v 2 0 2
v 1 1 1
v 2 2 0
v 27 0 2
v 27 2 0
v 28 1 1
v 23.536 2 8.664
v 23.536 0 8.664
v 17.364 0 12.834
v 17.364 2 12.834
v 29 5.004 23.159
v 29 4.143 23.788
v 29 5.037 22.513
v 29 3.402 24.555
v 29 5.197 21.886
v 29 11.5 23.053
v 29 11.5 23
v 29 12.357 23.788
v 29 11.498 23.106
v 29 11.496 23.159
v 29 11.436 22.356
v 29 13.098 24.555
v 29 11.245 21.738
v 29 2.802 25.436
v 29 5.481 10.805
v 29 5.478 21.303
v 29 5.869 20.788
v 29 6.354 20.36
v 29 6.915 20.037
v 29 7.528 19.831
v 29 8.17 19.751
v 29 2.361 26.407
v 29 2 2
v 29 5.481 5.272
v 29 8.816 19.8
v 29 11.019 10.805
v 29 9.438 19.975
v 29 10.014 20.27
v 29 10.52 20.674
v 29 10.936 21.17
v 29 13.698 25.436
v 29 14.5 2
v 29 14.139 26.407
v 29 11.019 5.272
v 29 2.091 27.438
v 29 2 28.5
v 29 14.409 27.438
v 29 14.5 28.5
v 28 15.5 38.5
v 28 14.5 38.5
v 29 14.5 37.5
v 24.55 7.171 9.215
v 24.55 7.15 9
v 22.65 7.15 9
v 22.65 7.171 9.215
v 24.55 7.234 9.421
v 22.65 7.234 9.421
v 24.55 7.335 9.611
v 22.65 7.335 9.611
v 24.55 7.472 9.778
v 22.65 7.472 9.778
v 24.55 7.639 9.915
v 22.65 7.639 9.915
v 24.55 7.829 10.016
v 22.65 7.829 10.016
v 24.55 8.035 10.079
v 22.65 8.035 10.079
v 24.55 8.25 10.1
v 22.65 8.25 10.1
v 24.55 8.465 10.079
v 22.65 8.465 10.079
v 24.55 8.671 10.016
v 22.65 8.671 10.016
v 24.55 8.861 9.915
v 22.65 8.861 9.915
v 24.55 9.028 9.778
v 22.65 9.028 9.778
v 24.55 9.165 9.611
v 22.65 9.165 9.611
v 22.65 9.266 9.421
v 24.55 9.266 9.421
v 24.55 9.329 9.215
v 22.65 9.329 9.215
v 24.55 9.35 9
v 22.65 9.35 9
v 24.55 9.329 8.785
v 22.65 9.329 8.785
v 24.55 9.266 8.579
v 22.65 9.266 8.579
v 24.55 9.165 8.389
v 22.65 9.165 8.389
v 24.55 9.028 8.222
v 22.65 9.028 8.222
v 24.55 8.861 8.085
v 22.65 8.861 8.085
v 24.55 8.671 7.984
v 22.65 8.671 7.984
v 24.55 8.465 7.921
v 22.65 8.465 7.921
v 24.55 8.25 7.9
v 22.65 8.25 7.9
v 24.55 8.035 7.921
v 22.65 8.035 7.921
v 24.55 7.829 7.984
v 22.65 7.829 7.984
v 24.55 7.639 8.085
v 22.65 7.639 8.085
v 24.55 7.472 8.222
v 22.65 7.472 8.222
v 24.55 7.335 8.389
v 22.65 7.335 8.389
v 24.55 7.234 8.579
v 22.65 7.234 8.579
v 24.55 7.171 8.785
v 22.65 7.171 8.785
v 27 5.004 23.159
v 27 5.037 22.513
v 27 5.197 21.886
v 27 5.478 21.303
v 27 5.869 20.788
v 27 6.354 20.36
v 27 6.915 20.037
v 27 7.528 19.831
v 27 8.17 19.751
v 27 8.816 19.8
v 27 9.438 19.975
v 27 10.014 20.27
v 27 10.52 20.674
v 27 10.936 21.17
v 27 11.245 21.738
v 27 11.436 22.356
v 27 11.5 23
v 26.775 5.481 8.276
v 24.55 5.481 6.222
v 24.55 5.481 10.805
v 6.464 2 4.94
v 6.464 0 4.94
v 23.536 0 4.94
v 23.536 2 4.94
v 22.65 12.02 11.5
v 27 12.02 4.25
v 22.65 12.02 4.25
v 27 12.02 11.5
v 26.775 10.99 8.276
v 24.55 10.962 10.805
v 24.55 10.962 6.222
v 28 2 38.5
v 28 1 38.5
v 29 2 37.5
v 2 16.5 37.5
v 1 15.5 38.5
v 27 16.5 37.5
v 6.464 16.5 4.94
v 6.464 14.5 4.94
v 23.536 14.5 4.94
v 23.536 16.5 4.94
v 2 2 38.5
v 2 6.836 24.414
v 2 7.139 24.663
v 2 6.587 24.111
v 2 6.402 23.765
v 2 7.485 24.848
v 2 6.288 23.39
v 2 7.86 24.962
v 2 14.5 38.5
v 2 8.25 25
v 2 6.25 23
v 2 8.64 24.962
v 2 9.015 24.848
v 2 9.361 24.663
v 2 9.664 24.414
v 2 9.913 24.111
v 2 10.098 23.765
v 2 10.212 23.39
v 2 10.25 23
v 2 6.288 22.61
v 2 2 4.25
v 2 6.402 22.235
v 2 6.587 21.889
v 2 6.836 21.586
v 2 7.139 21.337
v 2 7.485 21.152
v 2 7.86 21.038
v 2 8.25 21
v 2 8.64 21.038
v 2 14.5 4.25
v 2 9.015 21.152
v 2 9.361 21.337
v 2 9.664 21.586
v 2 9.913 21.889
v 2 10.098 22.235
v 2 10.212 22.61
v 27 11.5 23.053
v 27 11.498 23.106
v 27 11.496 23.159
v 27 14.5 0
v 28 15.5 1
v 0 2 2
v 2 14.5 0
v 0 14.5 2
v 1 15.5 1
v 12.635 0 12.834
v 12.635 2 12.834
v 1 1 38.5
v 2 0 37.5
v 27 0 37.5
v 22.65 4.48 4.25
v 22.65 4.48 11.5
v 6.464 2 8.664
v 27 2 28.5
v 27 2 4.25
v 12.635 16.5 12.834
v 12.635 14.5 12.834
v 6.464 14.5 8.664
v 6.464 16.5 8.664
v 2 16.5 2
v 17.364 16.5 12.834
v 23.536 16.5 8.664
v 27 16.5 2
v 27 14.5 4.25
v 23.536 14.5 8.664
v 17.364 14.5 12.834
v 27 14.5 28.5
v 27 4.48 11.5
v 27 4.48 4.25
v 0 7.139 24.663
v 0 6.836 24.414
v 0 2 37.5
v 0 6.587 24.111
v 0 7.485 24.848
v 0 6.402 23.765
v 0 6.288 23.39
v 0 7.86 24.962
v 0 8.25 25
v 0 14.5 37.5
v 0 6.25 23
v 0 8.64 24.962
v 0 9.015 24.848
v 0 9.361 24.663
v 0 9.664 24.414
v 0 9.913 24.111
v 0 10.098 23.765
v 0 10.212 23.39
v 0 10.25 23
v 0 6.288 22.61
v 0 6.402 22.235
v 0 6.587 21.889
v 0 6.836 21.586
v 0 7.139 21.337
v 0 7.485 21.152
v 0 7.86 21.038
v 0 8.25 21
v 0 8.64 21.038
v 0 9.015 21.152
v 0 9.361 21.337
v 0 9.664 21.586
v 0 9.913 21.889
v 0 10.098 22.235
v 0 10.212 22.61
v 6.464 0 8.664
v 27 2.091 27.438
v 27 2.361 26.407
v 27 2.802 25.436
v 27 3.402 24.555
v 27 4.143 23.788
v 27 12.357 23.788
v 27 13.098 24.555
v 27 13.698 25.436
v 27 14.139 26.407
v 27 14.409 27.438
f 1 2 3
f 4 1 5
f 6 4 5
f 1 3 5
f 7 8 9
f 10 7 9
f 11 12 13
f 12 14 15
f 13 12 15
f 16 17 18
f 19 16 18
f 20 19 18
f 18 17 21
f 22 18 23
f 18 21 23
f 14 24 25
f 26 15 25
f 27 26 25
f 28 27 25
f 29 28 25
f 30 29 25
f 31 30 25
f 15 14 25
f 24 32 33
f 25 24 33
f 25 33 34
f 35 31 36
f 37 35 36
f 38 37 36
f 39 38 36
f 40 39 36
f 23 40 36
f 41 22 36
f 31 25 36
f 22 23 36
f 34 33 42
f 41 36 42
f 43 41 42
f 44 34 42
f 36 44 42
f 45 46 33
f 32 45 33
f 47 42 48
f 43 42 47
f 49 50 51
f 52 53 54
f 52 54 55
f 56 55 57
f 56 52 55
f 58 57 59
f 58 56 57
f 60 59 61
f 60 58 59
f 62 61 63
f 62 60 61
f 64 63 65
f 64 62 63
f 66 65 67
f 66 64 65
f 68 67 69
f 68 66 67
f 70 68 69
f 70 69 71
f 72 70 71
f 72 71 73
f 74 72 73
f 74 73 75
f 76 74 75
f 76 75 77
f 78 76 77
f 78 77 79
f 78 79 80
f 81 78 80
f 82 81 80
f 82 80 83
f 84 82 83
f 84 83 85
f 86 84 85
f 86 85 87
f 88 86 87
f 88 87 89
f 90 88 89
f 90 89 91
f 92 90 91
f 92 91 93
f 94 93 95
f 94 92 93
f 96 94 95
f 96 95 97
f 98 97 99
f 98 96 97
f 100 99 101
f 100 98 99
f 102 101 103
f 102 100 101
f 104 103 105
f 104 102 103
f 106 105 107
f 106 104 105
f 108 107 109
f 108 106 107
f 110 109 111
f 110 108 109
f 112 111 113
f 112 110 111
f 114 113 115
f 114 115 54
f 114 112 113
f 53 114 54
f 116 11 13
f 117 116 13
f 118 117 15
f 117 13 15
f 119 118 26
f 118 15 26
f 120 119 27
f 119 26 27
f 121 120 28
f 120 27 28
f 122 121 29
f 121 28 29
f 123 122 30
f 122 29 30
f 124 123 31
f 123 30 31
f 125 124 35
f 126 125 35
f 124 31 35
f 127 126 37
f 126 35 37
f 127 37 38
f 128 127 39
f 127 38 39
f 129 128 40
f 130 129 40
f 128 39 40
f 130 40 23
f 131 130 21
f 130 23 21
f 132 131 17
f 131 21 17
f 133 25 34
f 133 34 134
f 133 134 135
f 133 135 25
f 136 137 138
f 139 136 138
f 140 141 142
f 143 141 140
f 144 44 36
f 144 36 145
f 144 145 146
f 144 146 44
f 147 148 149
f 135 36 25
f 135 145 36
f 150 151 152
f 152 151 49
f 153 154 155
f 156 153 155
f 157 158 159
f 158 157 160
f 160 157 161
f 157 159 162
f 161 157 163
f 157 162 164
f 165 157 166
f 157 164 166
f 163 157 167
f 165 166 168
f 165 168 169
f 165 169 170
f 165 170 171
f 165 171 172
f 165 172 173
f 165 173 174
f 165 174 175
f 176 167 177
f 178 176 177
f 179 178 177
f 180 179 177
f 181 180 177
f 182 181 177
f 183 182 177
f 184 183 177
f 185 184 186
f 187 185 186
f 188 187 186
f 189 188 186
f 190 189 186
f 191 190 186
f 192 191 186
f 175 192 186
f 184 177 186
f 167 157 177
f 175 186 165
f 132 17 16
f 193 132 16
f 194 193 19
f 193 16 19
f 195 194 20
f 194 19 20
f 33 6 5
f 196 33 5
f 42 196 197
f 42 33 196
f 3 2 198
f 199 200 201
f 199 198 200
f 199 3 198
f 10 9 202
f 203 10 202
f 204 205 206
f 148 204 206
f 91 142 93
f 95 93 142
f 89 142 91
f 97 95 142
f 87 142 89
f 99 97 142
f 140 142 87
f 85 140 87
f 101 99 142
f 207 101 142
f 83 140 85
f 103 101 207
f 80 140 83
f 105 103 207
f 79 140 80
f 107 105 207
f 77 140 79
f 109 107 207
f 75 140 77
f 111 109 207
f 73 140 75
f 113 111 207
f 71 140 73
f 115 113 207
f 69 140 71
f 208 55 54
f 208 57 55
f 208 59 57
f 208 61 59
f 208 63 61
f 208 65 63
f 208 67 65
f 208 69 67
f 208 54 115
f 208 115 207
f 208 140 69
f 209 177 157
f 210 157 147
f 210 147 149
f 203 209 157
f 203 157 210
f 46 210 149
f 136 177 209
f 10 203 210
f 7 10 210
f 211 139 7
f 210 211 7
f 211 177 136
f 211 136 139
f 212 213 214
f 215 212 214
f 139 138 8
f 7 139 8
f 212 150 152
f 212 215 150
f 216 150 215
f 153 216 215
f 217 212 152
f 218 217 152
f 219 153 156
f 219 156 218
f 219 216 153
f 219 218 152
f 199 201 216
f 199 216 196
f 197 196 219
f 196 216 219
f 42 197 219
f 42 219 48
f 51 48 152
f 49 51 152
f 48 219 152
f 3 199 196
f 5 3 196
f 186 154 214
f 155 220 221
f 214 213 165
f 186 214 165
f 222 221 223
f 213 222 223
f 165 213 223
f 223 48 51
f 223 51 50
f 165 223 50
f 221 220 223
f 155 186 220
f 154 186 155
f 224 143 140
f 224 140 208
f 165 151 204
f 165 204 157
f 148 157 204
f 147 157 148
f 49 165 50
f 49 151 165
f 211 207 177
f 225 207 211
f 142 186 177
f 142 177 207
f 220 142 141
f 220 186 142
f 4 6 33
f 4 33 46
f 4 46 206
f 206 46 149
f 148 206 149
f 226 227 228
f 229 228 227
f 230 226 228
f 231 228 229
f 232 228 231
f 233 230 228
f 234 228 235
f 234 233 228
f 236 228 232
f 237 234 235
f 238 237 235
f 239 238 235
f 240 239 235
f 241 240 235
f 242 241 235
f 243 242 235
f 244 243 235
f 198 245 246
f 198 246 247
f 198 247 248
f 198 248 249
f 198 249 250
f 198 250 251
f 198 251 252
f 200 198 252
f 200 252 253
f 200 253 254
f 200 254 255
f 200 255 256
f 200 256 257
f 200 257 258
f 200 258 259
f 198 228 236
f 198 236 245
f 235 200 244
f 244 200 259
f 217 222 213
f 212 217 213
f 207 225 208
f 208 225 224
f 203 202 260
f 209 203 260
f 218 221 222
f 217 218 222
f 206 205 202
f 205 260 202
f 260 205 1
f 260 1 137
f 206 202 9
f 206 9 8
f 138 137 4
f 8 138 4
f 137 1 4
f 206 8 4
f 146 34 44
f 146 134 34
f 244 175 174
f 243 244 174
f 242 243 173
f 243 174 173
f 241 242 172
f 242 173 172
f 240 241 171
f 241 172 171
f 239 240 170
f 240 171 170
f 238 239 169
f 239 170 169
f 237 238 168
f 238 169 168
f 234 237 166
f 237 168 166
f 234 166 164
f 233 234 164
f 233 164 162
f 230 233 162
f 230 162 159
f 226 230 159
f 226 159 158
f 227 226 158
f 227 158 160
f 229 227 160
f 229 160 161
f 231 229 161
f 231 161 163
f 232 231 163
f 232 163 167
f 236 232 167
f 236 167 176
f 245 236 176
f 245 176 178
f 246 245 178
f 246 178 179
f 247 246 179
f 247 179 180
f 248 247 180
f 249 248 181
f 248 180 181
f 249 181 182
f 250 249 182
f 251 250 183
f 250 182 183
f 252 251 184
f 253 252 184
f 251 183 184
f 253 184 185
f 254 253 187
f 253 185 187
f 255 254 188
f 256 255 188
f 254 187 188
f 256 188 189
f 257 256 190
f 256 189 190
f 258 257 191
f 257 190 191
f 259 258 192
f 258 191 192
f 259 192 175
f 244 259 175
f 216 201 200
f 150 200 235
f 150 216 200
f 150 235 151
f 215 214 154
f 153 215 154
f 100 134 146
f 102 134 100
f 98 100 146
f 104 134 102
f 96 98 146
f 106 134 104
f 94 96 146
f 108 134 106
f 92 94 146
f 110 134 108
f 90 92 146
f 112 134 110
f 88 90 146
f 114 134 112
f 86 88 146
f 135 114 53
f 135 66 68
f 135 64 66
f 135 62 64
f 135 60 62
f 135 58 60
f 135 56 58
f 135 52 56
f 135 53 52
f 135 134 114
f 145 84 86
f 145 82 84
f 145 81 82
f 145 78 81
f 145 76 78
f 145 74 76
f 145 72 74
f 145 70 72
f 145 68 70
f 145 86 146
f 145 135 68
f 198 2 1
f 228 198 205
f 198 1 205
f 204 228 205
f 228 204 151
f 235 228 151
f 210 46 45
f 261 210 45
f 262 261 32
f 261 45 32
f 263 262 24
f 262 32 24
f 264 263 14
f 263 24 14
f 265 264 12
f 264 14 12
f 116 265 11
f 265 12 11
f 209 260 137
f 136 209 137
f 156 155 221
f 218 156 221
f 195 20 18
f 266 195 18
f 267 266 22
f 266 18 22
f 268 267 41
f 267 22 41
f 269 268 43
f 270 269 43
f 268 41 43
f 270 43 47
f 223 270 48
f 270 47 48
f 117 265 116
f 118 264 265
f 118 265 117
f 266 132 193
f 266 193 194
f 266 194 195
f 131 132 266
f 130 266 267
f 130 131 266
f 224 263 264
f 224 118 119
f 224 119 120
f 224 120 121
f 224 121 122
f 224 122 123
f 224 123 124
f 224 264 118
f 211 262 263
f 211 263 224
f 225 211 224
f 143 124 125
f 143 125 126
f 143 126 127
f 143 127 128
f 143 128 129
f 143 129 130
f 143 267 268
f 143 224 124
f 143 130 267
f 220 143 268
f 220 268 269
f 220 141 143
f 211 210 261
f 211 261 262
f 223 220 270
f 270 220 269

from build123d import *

# Parameters (mm, degrees)
F0_W      = 29
F0_H      = 16.5
F1_DEPTH  = 38.5
F2_T      = -2
F3_DEPTH  = 2.25
F4_SIZE   = 2
F5_SIZE   = 2
F6_SIZE   = 0.99999
F8_DEPTH  = 16.501
F9_W      = 12.5
F9_H      = 0.99999
F10_DEPTH = 2
F11_R     = 2
F12_DEPTH = 2.001
F13_W     = 7.54
F13_H     = 7.25
F13_R     = 1.1
F14_DEPTH = 4.35
F15_W     = 5.538
F15_H     = 5.533
F17_W     = 5.481
F17_H     = 4.583


# Not quite as in the source:
# - a fillet or chamfer is up to 0.001 mm smaller than in the source, because OpenCascade refuses the exact size


with BuildPart() as f1:
    # F0 (on Top) → F1 (new body)
    with BuildSketch(Plane.XY):
        with Locations((14.5, 8.25)):
            Rectangle(F0_W, F0_H)
    extrude(amount=F1_DEPTH)

    # F2
    f2_openings = [f1.faces().sort_by_distance(p)[0] for p in [
        (14.5, 8.25, 38.5),
    ]]
    offset(amount=F2_T, openings=f2_openings)

    # F3 (add): a face of the model
    f3_faces = [f1.faces().sort_by_distance(p)[0] for p in [
        (14.5, 8.25, 2),
    ]]
    extrude(f3_faces, amount=F3_DEPTH)

    # F4
    f4_edges = [f1.edges().sort_by_distance(p)[0] for p in [
        (0, 0, 19.25),
        (29, 0, 19.25),
        (29, 16.5, 19.25),
        (0, 16.5, 19.25),
    ]]
    chamfer(f4_edges, length=F4_SIZE)

    # F5 (call 1 of 4: OpenCascade refuses the feature's edges together)
    f5_edges = [f1.edges().sort_by_distance(p)[0] for p in [
        (14.5, 0, 0),
    ]]
    chamfer(f5_edges, length=F5_SIZE)

    # F5#2 (call 2 of 4)
    f5_2_edges = [f1.edges().sort_by_distance(p)[0] for p in [
        (0, 8.25, 0),
    ]]
    chamfer(f5_2_edges, length=F5_SIZE)

    # F5#3 (call 3 of 4)
    f5_3_edges = [f1.edges().sort_by_distance(p)[0] for p in [
        (14.5, 16.5, 0),
    ]]
    chamfer(f5_3_edges, length=F5_SIZE)

    # F5#4 (call 4 of 4)
    f5_4_edges = [f1.edges().sort_by_distance(p)[0] for p in [
        (29, 8.25, 0),
    ]]
    chamfer(f5_4_edges, length=F5_SIZE)

    # F6 (size 1 in the source; OpenCascade refuses exactly that, so slightly less here)
    f6_edges = [f1.edges().sort_by_distance(p)[0] for p in [
        (0, 8.25, 38.5),
        (14.5, 16.5, 38.5),
        (29, 8.25, 38.5),
        (14.5, 0, 38.5),
    ]]
    chamfer(f6_edges, length=F6_SIZE)

    # F7 (on face) → F8 (cut, through all)
    with BuildSketch(Plane.XZ):
        Polygon((6.464, 8.664), (6.464, 4.94), (23.536, 4.94), (23.536, 8.664), (17.364, 12.834), (12.635, 12.834), align=None)
    extrude(amount=-F8_DEPTH, mode=Mode.SUBTRACT)

    # F9 (on face) → F10 (cut, through all)
    with BuildSketch(Plane.YZ.offset(29)):
        with BuildLine():
            ThreePointArc((5.0038961688, 23.1590909091), (8.25, 22.25), (11.4961038312, 23.1590909091))
            ThreePointArc((11.4961038312, 23.1590909091), (8.25, 26.25), (5.0038961688, 23.1590909091))
        make_face()
        with BuildLine():
            ThreePointArc((5.0038961688, 23.1590909091), (8.1704306945, 19.7509741882), (11.5, 23))
            ThreePointArc((11.5, 23), (11.4990258118, 23.0795693055), (11.4961038312, 23.1590909091))
            ThreePointArc((11.4961038312, 23.1590909091), (8.25, 22.25), (5.0038961688, 23.1590909091))
        make_face()
        with BuildLine():
            ThreePointArc((5.0038961688, 23.1590909091), (8.25, 26.25), (11.4961038312, 23.1590909091))
            ThreePointArc((11.4961038312, 23.1590909091), (13.6975062618, 25.4361502113), (14.5, 28.5))
            Line((14.5, 28.5), (2, 28.5))
            ThreePointArc((2, 28.5), (2.8024937382, 25.4361502113), (5.0038961688, 23.1590909091))
        make_face()
        with BuildLine():
            Line((2, 28.5), (14.5, 28.5))
            ThreePointArc((14.5, 28.5), (8.25, 34.75), (2, 28.5))
        make_face()
        with BuildLine():
            ThreePointArc((2, 28.5), (8.25, 34.75), (14.5, 28.5))
            Line((14.5, 28.5), (14.5, 37.50001))
            Line((14.5, 37.50001), (2, 37.50001))
            Line((2, 37.50001), (2, 28.5))
        make_face()
        with Locations((8.25, 38.000005)):
            Rectangle(F9_W, F9_H)
    extrude(amount=-F10_DEPTH, mode=Mode.SUBTRACT)

    # F11 (on face) → F12 (cut, through all)
    with BuildSketch(Plane.YZ.offset(2)):
        with Locations((8.25, 23)):
            Circle(F11_R)
    extrude(amount=-F12_DEPTH, mode=Mode.SUBTRACT)

    # F13 (on face) → F14 (join)
    with BuildSketch(Plane(origin=(27, 0, 0), x_dir=(0, -1, 0), z_dir=(-1, 0, 0))):
        with Locations((-8.25, 7.875)):
            Rectangle(F13_W, F13_H)
        with Locations((-8.25, 9)):
            Circle(F13_R, mode=Mode.SUBTRACT)
    extrude(amount=F14_DEPTH)

    # F15 (on face) → F18 section 0
    with BuildSketch(Plane.YZ.offset(29)):
        with Locations((8.25, 8.0385)):
            Rectangle(F15_W, F15_H)
    # F17 (on offset) → F18 section 1
    with BuildSketch(Plane.YZ.offset(24.55)):
        with Locations((8.2215, 8.5135)):
            Rectangle(F17_W, F17_H)
    loft(mode=Mode.SUBTRACT)


solid = f1.part
